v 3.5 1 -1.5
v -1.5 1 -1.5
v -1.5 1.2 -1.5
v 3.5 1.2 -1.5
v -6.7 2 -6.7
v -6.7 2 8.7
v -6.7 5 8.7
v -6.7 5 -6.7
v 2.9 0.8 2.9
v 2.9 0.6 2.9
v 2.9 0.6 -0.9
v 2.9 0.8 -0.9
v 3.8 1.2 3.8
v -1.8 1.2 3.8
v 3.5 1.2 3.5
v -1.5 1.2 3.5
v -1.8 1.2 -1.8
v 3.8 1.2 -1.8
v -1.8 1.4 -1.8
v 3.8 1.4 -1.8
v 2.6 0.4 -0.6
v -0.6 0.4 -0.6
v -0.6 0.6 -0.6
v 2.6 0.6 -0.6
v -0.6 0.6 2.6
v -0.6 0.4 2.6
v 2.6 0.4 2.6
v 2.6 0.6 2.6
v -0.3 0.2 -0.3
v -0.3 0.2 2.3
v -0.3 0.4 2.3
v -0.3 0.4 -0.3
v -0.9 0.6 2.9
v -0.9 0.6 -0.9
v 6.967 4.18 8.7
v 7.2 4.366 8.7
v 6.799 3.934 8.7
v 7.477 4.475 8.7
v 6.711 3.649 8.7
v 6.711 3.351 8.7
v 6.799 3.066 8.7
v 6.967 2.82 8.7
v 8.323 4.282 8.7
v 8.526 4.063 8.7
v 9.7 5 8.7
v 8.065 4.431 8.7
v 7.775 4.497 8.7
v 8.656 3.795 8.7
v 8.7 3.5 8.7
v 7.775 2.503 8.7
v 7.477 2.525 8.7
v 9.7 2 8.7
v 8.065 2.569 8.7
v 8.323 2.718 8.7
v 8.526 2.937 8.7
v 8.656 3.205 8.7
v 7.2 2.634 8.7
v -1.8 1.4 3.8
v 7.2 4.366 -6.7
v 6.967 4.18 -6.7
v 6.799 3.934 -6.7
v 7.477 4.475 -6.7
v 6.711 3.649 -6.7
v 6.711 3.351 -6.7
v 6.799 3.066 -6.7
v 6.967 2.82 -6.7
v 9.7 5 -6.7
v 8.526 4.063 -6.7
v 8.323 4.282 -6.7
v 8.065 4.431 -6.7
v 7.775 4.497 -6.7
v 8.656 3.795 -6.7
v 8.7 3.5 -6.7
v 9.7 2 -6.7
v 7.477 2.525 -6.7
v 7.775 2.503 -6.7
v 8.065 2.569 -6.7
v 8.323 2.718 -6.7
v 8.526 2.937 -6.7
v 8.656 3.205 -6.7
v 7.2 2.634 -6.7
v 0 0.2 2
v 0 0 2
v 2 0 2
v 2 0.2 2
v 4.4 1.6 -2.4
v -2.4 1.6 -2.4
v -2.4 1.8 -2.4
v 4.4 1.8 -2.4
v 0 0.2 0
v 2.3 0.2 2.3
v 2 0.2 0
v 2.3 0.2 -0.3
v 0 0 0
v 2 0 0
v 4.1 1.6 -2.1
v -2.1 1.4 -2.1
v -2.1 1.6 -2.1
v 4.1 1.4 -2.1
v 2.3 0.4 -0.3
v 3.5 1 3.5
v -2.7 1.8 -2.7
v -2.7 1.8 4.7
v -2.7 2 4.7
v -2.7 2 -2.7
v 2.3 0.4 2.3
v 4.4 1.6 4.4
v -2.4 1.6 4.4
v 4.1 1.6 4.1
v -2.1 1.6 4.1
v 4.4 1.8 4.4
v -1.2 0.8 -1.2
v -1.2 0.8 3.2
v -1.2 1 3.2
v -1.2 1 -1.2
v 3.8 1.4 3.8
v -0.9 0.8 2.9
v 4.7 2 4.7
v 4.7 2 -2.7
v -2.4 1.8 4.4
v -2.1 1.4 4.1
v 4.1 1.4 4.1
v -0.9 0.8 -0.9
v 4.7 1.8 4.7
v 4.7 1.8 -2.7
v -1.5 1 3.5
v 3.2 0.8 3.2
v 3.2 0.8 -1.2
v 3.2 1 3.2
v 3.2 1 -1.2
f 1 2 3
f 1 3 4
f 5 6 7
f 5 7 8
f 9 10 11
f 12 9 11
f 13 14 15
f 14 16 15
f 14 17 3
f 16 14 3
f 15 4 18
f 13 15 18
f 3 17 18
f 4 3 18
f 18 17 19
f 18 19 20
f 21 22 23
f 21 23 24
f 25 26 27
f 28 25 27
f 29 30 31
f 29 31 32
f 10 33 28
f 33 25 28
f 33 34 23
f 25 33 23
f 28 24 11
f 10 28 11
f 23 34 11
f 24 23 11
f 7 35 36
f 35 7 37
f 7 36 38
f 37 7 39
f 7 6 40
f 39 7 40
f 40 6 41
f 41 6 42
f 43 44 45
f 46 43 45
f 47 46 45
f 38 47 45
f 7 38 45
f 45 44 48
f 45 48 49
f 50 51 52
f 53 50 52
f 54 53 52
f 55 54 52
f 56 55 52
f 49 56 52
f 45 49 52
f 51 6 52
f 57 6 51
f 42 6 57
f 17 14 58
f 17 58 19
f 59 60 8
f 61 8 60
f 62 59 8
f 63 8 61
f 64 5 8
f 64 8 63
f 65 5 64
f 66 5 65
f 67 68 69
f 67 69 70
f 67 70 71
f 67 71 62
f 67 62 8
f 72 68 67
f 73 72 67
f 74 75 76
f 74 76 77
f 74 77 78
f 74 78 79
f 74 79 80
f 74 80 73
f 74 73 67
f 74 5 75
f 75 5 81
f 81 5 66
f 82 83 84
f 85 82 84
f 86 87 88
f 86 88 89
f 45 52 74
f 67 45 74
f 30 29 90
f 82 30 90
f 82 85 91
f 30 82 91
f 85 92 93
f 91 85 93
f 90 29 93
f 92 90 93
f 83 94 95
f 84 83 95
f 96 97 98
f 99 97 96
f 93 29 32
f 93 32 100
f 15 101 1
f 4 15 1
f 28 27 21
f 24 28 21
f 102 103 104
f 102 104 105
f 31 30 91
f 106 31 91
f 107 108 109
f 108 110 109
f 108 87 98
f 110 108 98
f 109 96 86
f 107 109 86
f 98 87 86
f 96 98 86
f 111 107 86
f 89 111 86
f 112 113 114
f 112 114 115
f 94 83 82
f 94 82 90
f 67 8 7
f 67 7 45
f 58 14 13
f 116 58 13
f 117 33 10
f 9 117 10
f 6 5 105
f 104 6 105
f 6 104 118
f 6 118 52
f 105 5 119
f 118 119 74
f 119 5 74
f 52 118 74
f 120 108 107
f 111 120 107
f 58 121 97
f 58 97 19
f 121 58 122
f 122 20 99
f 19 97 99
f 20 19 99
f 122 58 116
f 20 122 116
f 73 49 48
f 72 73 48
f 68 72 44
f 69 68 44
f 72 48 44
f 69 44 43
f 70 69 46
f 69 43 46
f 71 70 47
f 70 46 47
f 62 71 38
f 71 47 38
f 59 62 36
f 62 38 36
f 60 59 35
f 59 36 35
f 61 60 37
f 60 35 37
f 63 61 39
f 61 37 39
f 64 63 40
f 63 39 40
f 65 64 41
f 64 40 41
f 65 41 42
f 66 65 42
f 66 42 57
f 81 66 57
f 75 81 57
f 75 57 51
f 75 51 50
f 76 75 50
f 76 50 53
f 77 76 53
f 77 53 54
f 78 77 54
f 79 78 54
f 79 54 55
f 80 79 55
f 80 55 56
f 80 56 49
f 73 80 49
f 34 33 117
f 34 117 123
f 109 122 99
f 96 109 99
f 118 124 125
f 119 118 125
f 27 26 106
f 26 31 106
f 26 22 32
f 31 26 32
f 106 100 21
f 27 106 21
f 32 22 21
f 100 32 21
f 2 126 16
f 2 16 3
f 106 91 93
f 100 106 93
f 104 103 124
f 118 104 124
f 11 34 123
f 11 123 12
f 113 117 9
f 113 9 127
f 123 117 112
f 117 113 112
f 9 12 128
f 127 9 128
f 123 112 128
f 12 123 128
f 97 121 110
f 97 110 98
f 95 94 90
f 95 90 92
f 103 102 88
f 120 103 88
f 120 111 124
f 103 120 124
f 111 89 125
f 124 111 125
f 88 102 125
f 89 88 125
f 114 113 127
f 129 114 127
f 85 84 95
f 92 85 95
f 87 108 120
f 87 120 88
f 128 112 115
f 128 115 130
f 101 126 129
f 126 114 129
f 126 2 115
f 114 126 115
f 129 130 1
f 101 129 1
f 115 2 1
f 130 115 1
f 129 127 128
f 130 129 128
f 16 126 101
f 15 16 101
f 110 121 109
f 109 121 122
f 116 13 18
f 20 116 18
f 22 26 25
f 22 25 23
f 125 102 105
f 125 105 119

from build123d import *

# Parameters (mm, degrees)
CROQUIS1_W               = 2
CROQUIS1_H               = 2
SALIENTE_EXTRUIR1_DEPTH  = 0.2
CROQUIS2_W               = 2.6
CROQUIS2_H               = 2.6
SALIENTE_EXTRUIR2_DEPTH  = 0.2
CROQUIS3_W               = 3.2
CROQUIS3_H               = 3.2
SALIENTE_EXTRUIR3_DEPTH  = 0.2
CROQUIS4_W               = 3.8
CROQUIS4_H               = 3.8
SALIENTE_EXTRUIR4_DEPTH  = 0.2
CROQUIS5_W               = 4.4
CROQUIS5_H               = 4.4
SALIENTE_EXTRUIR5_DEPTH  = 0.2
CROQUIS6_W               = 5
CROQUIS6_H               = 5
SALIENTE_EXTRUIR6_DEPTH  = 0.2
CROQUIS7_W               = 5.6
CROQUIS7_H               = 5.6
SALIENTE_EXTRUIR7_DEPTH  = 0.2
CROQUIS8_W               = 6.2
CROQUIS8_H               = 6.2
SALIENTE_EXTRUIR8_DEPTH  = 0.2
CROQUIS9_W               = 6.8
CROQUIS9_H               = 6.8
SALIENTE_EXTRUIR9_DEPTH  = 0.2
CROQUIS10_W              = 7.4
CROQUIS10_H              = 7.4
SALIENTE_EXTRUIR10_DEPTH = 0.2
CROQUIS11_W              = 16.4
CROQUIS11_H              = 15.4
SALIENTE_EXTRUIR11_DEPTH = 3
CROQUIS12_R              = 1
CORTAR_EXTRUIR1_DEPTH    = 16.4


with BuildPart() as part:
    # Croquis1 → Saliente-Extruir1 (new body)
    with BuildSketch(Plane(origin=(0, 0, 0), x_dir=(1, 0, 0), z_dir=(0, 1, 0))):
        with Locations((1, -1)):
            Rectangle(CROQUIS1_W, CROQUIS1_H)
    extrude(amount=SALIENTE_EXTRUIR1_DEPTH)

    # Croquis2 → Saliente-Extruir2 (add)
    with BuildSketch(Plane(origin=(0, 0.2, 0), x_dir=(1, 0, 0), z_dir=(0, 1, 0))):
        with Locations((1, -1)):
            Rectangle(CROQUIS2_W, CROQUIS2_H)
    extrude(amount=SALIENTE_EXTRUIR2_DEPTH)

    # Croquis3 → Saliente-Extruir3 (add)
    with BuildSketch(Plane(origin=(0, 0.4, 0), x_dir=(1, 0, 0), z_dir=(0, 1, 0))):
        with Locations((1, -1)):
            Rectangle(CROQUIS3_W, CROQUIS3_H)
    extrude(amount=SALIENTE_EXTRUIR3_DEPTH)

    # Croquis4 → Saliente-Extruir4 (add)
    with BuildSketch(Plane(origin=(0, 0.6, 0), x_dir=(1, 0, 0), z_dir=(0, 1, 0))):
        with Locations((1, -1)):
            Rectangle(CROQUIS4_W, CROQUIS4_H)
    extrude(amount=SALIENTE_EXTRUIR4_DEPTH)

    # Croquis5 → Saliente-Extruir5 (add)
    with BuildSketch(Plane(origin=(0, 0.8, 0), x_dir=(1, 0, 0), z_dir=(0, 1, 0))):
        with Locations((1, -1)):
            Rectangle(CROQUIS5_W, CROQUIS5_H)
    extrude(amount=SALIENTE_EXTRUIR5_DEPTH)

    # Croquis6 → Saliente-Extruir6 (add)
    with BuildSketch(Plane(origin=(0, 1, 0), x_dir=(1, 0, 0), z_dir=(0, 1, 0))):
        with Locations((1, -1)):
            Rectangle(CROQUIS6_W, CROQUIS6_H)
    extrude(amount=SALIENTE_EXTRUIR6_DEPTH)

    # Croquis7 → Saliente-Extruir7 (add)
    with BuildSketch(Plane(origin=(0, 1.2, 0), x_dir=(1, 0, 0), z_dir=(0, 1, 0))):
        with Locations((1, -1)):
            Rectangle(CROQUIS7_W, CROQUIS7_H)
    extrude(amount=SALIENTE_EXTRUIR7_DEPTH)

    # Croquis8 → Saliente-Extruir8 (add)
    with BuildSketch(Plane(origin=(0, 1.4, 0), x_dir=(1, 0, 0), z_dir=(0, 1, 0))):
        with Locations((1, -1)):
            Rectangle(CROQUIS8_W, CROQUIS8_H)
    extrude(amount=SALIENTE_EXTRUIR8_DEPTH)

    # Croquis9 → Saliente-Extruir9 (add)
    with BuildSketch(Plane(origin=(0, 1.6, 0), x_dir=(1, 0, 0), z_dir=(0, 1, 0))):
        with Locations((1, -1)):
            Rectangle(CROQUIS9_W, CROQUIS9_H)
    extrude(amount=SALIENTE_EXTRUIR9_DEPTH)

    # Croquis10 → Saliente-Extruir10 (add)
    with BuildSketch(Plane(origin=(0, 1.8, 0), x_dir=(1, 0, 0), z_dir=(0, 1, 0))):
        with Locations((1, -1)):
            Rectangle(CROQUIS10_W, CROQUIS10_H)
    extrude(amount=SALIENTE_EXTRUIR10_DEPTH)

    # Croquis11 → Saliente-Extruir11 (add)
    with BuildSketch(Plane(origin=(0, 2, 0), x_dir=(1, 0, 0), z_dir=(0, 1, 0))):
        with Locations((1.5, -1)):
            Rectangle(CROQUIS11_W, CROQUIS11_H)
    extrude(amount=SALIENTE_EXTRUIR11_DEPTH)

    # Croquis12 → Cortar-Extruir1 (cut, through all)
    with BuildSketch(Plane.XY.offset(8.7)):
        with Locations((7.7, 3.5)):
            Circle(CROQUIS12_R)
    extrude(amount=-CORTAR_EXTRUIR1_DEPTH, mode=Mode.SUBTRACT)


solid = part.part
